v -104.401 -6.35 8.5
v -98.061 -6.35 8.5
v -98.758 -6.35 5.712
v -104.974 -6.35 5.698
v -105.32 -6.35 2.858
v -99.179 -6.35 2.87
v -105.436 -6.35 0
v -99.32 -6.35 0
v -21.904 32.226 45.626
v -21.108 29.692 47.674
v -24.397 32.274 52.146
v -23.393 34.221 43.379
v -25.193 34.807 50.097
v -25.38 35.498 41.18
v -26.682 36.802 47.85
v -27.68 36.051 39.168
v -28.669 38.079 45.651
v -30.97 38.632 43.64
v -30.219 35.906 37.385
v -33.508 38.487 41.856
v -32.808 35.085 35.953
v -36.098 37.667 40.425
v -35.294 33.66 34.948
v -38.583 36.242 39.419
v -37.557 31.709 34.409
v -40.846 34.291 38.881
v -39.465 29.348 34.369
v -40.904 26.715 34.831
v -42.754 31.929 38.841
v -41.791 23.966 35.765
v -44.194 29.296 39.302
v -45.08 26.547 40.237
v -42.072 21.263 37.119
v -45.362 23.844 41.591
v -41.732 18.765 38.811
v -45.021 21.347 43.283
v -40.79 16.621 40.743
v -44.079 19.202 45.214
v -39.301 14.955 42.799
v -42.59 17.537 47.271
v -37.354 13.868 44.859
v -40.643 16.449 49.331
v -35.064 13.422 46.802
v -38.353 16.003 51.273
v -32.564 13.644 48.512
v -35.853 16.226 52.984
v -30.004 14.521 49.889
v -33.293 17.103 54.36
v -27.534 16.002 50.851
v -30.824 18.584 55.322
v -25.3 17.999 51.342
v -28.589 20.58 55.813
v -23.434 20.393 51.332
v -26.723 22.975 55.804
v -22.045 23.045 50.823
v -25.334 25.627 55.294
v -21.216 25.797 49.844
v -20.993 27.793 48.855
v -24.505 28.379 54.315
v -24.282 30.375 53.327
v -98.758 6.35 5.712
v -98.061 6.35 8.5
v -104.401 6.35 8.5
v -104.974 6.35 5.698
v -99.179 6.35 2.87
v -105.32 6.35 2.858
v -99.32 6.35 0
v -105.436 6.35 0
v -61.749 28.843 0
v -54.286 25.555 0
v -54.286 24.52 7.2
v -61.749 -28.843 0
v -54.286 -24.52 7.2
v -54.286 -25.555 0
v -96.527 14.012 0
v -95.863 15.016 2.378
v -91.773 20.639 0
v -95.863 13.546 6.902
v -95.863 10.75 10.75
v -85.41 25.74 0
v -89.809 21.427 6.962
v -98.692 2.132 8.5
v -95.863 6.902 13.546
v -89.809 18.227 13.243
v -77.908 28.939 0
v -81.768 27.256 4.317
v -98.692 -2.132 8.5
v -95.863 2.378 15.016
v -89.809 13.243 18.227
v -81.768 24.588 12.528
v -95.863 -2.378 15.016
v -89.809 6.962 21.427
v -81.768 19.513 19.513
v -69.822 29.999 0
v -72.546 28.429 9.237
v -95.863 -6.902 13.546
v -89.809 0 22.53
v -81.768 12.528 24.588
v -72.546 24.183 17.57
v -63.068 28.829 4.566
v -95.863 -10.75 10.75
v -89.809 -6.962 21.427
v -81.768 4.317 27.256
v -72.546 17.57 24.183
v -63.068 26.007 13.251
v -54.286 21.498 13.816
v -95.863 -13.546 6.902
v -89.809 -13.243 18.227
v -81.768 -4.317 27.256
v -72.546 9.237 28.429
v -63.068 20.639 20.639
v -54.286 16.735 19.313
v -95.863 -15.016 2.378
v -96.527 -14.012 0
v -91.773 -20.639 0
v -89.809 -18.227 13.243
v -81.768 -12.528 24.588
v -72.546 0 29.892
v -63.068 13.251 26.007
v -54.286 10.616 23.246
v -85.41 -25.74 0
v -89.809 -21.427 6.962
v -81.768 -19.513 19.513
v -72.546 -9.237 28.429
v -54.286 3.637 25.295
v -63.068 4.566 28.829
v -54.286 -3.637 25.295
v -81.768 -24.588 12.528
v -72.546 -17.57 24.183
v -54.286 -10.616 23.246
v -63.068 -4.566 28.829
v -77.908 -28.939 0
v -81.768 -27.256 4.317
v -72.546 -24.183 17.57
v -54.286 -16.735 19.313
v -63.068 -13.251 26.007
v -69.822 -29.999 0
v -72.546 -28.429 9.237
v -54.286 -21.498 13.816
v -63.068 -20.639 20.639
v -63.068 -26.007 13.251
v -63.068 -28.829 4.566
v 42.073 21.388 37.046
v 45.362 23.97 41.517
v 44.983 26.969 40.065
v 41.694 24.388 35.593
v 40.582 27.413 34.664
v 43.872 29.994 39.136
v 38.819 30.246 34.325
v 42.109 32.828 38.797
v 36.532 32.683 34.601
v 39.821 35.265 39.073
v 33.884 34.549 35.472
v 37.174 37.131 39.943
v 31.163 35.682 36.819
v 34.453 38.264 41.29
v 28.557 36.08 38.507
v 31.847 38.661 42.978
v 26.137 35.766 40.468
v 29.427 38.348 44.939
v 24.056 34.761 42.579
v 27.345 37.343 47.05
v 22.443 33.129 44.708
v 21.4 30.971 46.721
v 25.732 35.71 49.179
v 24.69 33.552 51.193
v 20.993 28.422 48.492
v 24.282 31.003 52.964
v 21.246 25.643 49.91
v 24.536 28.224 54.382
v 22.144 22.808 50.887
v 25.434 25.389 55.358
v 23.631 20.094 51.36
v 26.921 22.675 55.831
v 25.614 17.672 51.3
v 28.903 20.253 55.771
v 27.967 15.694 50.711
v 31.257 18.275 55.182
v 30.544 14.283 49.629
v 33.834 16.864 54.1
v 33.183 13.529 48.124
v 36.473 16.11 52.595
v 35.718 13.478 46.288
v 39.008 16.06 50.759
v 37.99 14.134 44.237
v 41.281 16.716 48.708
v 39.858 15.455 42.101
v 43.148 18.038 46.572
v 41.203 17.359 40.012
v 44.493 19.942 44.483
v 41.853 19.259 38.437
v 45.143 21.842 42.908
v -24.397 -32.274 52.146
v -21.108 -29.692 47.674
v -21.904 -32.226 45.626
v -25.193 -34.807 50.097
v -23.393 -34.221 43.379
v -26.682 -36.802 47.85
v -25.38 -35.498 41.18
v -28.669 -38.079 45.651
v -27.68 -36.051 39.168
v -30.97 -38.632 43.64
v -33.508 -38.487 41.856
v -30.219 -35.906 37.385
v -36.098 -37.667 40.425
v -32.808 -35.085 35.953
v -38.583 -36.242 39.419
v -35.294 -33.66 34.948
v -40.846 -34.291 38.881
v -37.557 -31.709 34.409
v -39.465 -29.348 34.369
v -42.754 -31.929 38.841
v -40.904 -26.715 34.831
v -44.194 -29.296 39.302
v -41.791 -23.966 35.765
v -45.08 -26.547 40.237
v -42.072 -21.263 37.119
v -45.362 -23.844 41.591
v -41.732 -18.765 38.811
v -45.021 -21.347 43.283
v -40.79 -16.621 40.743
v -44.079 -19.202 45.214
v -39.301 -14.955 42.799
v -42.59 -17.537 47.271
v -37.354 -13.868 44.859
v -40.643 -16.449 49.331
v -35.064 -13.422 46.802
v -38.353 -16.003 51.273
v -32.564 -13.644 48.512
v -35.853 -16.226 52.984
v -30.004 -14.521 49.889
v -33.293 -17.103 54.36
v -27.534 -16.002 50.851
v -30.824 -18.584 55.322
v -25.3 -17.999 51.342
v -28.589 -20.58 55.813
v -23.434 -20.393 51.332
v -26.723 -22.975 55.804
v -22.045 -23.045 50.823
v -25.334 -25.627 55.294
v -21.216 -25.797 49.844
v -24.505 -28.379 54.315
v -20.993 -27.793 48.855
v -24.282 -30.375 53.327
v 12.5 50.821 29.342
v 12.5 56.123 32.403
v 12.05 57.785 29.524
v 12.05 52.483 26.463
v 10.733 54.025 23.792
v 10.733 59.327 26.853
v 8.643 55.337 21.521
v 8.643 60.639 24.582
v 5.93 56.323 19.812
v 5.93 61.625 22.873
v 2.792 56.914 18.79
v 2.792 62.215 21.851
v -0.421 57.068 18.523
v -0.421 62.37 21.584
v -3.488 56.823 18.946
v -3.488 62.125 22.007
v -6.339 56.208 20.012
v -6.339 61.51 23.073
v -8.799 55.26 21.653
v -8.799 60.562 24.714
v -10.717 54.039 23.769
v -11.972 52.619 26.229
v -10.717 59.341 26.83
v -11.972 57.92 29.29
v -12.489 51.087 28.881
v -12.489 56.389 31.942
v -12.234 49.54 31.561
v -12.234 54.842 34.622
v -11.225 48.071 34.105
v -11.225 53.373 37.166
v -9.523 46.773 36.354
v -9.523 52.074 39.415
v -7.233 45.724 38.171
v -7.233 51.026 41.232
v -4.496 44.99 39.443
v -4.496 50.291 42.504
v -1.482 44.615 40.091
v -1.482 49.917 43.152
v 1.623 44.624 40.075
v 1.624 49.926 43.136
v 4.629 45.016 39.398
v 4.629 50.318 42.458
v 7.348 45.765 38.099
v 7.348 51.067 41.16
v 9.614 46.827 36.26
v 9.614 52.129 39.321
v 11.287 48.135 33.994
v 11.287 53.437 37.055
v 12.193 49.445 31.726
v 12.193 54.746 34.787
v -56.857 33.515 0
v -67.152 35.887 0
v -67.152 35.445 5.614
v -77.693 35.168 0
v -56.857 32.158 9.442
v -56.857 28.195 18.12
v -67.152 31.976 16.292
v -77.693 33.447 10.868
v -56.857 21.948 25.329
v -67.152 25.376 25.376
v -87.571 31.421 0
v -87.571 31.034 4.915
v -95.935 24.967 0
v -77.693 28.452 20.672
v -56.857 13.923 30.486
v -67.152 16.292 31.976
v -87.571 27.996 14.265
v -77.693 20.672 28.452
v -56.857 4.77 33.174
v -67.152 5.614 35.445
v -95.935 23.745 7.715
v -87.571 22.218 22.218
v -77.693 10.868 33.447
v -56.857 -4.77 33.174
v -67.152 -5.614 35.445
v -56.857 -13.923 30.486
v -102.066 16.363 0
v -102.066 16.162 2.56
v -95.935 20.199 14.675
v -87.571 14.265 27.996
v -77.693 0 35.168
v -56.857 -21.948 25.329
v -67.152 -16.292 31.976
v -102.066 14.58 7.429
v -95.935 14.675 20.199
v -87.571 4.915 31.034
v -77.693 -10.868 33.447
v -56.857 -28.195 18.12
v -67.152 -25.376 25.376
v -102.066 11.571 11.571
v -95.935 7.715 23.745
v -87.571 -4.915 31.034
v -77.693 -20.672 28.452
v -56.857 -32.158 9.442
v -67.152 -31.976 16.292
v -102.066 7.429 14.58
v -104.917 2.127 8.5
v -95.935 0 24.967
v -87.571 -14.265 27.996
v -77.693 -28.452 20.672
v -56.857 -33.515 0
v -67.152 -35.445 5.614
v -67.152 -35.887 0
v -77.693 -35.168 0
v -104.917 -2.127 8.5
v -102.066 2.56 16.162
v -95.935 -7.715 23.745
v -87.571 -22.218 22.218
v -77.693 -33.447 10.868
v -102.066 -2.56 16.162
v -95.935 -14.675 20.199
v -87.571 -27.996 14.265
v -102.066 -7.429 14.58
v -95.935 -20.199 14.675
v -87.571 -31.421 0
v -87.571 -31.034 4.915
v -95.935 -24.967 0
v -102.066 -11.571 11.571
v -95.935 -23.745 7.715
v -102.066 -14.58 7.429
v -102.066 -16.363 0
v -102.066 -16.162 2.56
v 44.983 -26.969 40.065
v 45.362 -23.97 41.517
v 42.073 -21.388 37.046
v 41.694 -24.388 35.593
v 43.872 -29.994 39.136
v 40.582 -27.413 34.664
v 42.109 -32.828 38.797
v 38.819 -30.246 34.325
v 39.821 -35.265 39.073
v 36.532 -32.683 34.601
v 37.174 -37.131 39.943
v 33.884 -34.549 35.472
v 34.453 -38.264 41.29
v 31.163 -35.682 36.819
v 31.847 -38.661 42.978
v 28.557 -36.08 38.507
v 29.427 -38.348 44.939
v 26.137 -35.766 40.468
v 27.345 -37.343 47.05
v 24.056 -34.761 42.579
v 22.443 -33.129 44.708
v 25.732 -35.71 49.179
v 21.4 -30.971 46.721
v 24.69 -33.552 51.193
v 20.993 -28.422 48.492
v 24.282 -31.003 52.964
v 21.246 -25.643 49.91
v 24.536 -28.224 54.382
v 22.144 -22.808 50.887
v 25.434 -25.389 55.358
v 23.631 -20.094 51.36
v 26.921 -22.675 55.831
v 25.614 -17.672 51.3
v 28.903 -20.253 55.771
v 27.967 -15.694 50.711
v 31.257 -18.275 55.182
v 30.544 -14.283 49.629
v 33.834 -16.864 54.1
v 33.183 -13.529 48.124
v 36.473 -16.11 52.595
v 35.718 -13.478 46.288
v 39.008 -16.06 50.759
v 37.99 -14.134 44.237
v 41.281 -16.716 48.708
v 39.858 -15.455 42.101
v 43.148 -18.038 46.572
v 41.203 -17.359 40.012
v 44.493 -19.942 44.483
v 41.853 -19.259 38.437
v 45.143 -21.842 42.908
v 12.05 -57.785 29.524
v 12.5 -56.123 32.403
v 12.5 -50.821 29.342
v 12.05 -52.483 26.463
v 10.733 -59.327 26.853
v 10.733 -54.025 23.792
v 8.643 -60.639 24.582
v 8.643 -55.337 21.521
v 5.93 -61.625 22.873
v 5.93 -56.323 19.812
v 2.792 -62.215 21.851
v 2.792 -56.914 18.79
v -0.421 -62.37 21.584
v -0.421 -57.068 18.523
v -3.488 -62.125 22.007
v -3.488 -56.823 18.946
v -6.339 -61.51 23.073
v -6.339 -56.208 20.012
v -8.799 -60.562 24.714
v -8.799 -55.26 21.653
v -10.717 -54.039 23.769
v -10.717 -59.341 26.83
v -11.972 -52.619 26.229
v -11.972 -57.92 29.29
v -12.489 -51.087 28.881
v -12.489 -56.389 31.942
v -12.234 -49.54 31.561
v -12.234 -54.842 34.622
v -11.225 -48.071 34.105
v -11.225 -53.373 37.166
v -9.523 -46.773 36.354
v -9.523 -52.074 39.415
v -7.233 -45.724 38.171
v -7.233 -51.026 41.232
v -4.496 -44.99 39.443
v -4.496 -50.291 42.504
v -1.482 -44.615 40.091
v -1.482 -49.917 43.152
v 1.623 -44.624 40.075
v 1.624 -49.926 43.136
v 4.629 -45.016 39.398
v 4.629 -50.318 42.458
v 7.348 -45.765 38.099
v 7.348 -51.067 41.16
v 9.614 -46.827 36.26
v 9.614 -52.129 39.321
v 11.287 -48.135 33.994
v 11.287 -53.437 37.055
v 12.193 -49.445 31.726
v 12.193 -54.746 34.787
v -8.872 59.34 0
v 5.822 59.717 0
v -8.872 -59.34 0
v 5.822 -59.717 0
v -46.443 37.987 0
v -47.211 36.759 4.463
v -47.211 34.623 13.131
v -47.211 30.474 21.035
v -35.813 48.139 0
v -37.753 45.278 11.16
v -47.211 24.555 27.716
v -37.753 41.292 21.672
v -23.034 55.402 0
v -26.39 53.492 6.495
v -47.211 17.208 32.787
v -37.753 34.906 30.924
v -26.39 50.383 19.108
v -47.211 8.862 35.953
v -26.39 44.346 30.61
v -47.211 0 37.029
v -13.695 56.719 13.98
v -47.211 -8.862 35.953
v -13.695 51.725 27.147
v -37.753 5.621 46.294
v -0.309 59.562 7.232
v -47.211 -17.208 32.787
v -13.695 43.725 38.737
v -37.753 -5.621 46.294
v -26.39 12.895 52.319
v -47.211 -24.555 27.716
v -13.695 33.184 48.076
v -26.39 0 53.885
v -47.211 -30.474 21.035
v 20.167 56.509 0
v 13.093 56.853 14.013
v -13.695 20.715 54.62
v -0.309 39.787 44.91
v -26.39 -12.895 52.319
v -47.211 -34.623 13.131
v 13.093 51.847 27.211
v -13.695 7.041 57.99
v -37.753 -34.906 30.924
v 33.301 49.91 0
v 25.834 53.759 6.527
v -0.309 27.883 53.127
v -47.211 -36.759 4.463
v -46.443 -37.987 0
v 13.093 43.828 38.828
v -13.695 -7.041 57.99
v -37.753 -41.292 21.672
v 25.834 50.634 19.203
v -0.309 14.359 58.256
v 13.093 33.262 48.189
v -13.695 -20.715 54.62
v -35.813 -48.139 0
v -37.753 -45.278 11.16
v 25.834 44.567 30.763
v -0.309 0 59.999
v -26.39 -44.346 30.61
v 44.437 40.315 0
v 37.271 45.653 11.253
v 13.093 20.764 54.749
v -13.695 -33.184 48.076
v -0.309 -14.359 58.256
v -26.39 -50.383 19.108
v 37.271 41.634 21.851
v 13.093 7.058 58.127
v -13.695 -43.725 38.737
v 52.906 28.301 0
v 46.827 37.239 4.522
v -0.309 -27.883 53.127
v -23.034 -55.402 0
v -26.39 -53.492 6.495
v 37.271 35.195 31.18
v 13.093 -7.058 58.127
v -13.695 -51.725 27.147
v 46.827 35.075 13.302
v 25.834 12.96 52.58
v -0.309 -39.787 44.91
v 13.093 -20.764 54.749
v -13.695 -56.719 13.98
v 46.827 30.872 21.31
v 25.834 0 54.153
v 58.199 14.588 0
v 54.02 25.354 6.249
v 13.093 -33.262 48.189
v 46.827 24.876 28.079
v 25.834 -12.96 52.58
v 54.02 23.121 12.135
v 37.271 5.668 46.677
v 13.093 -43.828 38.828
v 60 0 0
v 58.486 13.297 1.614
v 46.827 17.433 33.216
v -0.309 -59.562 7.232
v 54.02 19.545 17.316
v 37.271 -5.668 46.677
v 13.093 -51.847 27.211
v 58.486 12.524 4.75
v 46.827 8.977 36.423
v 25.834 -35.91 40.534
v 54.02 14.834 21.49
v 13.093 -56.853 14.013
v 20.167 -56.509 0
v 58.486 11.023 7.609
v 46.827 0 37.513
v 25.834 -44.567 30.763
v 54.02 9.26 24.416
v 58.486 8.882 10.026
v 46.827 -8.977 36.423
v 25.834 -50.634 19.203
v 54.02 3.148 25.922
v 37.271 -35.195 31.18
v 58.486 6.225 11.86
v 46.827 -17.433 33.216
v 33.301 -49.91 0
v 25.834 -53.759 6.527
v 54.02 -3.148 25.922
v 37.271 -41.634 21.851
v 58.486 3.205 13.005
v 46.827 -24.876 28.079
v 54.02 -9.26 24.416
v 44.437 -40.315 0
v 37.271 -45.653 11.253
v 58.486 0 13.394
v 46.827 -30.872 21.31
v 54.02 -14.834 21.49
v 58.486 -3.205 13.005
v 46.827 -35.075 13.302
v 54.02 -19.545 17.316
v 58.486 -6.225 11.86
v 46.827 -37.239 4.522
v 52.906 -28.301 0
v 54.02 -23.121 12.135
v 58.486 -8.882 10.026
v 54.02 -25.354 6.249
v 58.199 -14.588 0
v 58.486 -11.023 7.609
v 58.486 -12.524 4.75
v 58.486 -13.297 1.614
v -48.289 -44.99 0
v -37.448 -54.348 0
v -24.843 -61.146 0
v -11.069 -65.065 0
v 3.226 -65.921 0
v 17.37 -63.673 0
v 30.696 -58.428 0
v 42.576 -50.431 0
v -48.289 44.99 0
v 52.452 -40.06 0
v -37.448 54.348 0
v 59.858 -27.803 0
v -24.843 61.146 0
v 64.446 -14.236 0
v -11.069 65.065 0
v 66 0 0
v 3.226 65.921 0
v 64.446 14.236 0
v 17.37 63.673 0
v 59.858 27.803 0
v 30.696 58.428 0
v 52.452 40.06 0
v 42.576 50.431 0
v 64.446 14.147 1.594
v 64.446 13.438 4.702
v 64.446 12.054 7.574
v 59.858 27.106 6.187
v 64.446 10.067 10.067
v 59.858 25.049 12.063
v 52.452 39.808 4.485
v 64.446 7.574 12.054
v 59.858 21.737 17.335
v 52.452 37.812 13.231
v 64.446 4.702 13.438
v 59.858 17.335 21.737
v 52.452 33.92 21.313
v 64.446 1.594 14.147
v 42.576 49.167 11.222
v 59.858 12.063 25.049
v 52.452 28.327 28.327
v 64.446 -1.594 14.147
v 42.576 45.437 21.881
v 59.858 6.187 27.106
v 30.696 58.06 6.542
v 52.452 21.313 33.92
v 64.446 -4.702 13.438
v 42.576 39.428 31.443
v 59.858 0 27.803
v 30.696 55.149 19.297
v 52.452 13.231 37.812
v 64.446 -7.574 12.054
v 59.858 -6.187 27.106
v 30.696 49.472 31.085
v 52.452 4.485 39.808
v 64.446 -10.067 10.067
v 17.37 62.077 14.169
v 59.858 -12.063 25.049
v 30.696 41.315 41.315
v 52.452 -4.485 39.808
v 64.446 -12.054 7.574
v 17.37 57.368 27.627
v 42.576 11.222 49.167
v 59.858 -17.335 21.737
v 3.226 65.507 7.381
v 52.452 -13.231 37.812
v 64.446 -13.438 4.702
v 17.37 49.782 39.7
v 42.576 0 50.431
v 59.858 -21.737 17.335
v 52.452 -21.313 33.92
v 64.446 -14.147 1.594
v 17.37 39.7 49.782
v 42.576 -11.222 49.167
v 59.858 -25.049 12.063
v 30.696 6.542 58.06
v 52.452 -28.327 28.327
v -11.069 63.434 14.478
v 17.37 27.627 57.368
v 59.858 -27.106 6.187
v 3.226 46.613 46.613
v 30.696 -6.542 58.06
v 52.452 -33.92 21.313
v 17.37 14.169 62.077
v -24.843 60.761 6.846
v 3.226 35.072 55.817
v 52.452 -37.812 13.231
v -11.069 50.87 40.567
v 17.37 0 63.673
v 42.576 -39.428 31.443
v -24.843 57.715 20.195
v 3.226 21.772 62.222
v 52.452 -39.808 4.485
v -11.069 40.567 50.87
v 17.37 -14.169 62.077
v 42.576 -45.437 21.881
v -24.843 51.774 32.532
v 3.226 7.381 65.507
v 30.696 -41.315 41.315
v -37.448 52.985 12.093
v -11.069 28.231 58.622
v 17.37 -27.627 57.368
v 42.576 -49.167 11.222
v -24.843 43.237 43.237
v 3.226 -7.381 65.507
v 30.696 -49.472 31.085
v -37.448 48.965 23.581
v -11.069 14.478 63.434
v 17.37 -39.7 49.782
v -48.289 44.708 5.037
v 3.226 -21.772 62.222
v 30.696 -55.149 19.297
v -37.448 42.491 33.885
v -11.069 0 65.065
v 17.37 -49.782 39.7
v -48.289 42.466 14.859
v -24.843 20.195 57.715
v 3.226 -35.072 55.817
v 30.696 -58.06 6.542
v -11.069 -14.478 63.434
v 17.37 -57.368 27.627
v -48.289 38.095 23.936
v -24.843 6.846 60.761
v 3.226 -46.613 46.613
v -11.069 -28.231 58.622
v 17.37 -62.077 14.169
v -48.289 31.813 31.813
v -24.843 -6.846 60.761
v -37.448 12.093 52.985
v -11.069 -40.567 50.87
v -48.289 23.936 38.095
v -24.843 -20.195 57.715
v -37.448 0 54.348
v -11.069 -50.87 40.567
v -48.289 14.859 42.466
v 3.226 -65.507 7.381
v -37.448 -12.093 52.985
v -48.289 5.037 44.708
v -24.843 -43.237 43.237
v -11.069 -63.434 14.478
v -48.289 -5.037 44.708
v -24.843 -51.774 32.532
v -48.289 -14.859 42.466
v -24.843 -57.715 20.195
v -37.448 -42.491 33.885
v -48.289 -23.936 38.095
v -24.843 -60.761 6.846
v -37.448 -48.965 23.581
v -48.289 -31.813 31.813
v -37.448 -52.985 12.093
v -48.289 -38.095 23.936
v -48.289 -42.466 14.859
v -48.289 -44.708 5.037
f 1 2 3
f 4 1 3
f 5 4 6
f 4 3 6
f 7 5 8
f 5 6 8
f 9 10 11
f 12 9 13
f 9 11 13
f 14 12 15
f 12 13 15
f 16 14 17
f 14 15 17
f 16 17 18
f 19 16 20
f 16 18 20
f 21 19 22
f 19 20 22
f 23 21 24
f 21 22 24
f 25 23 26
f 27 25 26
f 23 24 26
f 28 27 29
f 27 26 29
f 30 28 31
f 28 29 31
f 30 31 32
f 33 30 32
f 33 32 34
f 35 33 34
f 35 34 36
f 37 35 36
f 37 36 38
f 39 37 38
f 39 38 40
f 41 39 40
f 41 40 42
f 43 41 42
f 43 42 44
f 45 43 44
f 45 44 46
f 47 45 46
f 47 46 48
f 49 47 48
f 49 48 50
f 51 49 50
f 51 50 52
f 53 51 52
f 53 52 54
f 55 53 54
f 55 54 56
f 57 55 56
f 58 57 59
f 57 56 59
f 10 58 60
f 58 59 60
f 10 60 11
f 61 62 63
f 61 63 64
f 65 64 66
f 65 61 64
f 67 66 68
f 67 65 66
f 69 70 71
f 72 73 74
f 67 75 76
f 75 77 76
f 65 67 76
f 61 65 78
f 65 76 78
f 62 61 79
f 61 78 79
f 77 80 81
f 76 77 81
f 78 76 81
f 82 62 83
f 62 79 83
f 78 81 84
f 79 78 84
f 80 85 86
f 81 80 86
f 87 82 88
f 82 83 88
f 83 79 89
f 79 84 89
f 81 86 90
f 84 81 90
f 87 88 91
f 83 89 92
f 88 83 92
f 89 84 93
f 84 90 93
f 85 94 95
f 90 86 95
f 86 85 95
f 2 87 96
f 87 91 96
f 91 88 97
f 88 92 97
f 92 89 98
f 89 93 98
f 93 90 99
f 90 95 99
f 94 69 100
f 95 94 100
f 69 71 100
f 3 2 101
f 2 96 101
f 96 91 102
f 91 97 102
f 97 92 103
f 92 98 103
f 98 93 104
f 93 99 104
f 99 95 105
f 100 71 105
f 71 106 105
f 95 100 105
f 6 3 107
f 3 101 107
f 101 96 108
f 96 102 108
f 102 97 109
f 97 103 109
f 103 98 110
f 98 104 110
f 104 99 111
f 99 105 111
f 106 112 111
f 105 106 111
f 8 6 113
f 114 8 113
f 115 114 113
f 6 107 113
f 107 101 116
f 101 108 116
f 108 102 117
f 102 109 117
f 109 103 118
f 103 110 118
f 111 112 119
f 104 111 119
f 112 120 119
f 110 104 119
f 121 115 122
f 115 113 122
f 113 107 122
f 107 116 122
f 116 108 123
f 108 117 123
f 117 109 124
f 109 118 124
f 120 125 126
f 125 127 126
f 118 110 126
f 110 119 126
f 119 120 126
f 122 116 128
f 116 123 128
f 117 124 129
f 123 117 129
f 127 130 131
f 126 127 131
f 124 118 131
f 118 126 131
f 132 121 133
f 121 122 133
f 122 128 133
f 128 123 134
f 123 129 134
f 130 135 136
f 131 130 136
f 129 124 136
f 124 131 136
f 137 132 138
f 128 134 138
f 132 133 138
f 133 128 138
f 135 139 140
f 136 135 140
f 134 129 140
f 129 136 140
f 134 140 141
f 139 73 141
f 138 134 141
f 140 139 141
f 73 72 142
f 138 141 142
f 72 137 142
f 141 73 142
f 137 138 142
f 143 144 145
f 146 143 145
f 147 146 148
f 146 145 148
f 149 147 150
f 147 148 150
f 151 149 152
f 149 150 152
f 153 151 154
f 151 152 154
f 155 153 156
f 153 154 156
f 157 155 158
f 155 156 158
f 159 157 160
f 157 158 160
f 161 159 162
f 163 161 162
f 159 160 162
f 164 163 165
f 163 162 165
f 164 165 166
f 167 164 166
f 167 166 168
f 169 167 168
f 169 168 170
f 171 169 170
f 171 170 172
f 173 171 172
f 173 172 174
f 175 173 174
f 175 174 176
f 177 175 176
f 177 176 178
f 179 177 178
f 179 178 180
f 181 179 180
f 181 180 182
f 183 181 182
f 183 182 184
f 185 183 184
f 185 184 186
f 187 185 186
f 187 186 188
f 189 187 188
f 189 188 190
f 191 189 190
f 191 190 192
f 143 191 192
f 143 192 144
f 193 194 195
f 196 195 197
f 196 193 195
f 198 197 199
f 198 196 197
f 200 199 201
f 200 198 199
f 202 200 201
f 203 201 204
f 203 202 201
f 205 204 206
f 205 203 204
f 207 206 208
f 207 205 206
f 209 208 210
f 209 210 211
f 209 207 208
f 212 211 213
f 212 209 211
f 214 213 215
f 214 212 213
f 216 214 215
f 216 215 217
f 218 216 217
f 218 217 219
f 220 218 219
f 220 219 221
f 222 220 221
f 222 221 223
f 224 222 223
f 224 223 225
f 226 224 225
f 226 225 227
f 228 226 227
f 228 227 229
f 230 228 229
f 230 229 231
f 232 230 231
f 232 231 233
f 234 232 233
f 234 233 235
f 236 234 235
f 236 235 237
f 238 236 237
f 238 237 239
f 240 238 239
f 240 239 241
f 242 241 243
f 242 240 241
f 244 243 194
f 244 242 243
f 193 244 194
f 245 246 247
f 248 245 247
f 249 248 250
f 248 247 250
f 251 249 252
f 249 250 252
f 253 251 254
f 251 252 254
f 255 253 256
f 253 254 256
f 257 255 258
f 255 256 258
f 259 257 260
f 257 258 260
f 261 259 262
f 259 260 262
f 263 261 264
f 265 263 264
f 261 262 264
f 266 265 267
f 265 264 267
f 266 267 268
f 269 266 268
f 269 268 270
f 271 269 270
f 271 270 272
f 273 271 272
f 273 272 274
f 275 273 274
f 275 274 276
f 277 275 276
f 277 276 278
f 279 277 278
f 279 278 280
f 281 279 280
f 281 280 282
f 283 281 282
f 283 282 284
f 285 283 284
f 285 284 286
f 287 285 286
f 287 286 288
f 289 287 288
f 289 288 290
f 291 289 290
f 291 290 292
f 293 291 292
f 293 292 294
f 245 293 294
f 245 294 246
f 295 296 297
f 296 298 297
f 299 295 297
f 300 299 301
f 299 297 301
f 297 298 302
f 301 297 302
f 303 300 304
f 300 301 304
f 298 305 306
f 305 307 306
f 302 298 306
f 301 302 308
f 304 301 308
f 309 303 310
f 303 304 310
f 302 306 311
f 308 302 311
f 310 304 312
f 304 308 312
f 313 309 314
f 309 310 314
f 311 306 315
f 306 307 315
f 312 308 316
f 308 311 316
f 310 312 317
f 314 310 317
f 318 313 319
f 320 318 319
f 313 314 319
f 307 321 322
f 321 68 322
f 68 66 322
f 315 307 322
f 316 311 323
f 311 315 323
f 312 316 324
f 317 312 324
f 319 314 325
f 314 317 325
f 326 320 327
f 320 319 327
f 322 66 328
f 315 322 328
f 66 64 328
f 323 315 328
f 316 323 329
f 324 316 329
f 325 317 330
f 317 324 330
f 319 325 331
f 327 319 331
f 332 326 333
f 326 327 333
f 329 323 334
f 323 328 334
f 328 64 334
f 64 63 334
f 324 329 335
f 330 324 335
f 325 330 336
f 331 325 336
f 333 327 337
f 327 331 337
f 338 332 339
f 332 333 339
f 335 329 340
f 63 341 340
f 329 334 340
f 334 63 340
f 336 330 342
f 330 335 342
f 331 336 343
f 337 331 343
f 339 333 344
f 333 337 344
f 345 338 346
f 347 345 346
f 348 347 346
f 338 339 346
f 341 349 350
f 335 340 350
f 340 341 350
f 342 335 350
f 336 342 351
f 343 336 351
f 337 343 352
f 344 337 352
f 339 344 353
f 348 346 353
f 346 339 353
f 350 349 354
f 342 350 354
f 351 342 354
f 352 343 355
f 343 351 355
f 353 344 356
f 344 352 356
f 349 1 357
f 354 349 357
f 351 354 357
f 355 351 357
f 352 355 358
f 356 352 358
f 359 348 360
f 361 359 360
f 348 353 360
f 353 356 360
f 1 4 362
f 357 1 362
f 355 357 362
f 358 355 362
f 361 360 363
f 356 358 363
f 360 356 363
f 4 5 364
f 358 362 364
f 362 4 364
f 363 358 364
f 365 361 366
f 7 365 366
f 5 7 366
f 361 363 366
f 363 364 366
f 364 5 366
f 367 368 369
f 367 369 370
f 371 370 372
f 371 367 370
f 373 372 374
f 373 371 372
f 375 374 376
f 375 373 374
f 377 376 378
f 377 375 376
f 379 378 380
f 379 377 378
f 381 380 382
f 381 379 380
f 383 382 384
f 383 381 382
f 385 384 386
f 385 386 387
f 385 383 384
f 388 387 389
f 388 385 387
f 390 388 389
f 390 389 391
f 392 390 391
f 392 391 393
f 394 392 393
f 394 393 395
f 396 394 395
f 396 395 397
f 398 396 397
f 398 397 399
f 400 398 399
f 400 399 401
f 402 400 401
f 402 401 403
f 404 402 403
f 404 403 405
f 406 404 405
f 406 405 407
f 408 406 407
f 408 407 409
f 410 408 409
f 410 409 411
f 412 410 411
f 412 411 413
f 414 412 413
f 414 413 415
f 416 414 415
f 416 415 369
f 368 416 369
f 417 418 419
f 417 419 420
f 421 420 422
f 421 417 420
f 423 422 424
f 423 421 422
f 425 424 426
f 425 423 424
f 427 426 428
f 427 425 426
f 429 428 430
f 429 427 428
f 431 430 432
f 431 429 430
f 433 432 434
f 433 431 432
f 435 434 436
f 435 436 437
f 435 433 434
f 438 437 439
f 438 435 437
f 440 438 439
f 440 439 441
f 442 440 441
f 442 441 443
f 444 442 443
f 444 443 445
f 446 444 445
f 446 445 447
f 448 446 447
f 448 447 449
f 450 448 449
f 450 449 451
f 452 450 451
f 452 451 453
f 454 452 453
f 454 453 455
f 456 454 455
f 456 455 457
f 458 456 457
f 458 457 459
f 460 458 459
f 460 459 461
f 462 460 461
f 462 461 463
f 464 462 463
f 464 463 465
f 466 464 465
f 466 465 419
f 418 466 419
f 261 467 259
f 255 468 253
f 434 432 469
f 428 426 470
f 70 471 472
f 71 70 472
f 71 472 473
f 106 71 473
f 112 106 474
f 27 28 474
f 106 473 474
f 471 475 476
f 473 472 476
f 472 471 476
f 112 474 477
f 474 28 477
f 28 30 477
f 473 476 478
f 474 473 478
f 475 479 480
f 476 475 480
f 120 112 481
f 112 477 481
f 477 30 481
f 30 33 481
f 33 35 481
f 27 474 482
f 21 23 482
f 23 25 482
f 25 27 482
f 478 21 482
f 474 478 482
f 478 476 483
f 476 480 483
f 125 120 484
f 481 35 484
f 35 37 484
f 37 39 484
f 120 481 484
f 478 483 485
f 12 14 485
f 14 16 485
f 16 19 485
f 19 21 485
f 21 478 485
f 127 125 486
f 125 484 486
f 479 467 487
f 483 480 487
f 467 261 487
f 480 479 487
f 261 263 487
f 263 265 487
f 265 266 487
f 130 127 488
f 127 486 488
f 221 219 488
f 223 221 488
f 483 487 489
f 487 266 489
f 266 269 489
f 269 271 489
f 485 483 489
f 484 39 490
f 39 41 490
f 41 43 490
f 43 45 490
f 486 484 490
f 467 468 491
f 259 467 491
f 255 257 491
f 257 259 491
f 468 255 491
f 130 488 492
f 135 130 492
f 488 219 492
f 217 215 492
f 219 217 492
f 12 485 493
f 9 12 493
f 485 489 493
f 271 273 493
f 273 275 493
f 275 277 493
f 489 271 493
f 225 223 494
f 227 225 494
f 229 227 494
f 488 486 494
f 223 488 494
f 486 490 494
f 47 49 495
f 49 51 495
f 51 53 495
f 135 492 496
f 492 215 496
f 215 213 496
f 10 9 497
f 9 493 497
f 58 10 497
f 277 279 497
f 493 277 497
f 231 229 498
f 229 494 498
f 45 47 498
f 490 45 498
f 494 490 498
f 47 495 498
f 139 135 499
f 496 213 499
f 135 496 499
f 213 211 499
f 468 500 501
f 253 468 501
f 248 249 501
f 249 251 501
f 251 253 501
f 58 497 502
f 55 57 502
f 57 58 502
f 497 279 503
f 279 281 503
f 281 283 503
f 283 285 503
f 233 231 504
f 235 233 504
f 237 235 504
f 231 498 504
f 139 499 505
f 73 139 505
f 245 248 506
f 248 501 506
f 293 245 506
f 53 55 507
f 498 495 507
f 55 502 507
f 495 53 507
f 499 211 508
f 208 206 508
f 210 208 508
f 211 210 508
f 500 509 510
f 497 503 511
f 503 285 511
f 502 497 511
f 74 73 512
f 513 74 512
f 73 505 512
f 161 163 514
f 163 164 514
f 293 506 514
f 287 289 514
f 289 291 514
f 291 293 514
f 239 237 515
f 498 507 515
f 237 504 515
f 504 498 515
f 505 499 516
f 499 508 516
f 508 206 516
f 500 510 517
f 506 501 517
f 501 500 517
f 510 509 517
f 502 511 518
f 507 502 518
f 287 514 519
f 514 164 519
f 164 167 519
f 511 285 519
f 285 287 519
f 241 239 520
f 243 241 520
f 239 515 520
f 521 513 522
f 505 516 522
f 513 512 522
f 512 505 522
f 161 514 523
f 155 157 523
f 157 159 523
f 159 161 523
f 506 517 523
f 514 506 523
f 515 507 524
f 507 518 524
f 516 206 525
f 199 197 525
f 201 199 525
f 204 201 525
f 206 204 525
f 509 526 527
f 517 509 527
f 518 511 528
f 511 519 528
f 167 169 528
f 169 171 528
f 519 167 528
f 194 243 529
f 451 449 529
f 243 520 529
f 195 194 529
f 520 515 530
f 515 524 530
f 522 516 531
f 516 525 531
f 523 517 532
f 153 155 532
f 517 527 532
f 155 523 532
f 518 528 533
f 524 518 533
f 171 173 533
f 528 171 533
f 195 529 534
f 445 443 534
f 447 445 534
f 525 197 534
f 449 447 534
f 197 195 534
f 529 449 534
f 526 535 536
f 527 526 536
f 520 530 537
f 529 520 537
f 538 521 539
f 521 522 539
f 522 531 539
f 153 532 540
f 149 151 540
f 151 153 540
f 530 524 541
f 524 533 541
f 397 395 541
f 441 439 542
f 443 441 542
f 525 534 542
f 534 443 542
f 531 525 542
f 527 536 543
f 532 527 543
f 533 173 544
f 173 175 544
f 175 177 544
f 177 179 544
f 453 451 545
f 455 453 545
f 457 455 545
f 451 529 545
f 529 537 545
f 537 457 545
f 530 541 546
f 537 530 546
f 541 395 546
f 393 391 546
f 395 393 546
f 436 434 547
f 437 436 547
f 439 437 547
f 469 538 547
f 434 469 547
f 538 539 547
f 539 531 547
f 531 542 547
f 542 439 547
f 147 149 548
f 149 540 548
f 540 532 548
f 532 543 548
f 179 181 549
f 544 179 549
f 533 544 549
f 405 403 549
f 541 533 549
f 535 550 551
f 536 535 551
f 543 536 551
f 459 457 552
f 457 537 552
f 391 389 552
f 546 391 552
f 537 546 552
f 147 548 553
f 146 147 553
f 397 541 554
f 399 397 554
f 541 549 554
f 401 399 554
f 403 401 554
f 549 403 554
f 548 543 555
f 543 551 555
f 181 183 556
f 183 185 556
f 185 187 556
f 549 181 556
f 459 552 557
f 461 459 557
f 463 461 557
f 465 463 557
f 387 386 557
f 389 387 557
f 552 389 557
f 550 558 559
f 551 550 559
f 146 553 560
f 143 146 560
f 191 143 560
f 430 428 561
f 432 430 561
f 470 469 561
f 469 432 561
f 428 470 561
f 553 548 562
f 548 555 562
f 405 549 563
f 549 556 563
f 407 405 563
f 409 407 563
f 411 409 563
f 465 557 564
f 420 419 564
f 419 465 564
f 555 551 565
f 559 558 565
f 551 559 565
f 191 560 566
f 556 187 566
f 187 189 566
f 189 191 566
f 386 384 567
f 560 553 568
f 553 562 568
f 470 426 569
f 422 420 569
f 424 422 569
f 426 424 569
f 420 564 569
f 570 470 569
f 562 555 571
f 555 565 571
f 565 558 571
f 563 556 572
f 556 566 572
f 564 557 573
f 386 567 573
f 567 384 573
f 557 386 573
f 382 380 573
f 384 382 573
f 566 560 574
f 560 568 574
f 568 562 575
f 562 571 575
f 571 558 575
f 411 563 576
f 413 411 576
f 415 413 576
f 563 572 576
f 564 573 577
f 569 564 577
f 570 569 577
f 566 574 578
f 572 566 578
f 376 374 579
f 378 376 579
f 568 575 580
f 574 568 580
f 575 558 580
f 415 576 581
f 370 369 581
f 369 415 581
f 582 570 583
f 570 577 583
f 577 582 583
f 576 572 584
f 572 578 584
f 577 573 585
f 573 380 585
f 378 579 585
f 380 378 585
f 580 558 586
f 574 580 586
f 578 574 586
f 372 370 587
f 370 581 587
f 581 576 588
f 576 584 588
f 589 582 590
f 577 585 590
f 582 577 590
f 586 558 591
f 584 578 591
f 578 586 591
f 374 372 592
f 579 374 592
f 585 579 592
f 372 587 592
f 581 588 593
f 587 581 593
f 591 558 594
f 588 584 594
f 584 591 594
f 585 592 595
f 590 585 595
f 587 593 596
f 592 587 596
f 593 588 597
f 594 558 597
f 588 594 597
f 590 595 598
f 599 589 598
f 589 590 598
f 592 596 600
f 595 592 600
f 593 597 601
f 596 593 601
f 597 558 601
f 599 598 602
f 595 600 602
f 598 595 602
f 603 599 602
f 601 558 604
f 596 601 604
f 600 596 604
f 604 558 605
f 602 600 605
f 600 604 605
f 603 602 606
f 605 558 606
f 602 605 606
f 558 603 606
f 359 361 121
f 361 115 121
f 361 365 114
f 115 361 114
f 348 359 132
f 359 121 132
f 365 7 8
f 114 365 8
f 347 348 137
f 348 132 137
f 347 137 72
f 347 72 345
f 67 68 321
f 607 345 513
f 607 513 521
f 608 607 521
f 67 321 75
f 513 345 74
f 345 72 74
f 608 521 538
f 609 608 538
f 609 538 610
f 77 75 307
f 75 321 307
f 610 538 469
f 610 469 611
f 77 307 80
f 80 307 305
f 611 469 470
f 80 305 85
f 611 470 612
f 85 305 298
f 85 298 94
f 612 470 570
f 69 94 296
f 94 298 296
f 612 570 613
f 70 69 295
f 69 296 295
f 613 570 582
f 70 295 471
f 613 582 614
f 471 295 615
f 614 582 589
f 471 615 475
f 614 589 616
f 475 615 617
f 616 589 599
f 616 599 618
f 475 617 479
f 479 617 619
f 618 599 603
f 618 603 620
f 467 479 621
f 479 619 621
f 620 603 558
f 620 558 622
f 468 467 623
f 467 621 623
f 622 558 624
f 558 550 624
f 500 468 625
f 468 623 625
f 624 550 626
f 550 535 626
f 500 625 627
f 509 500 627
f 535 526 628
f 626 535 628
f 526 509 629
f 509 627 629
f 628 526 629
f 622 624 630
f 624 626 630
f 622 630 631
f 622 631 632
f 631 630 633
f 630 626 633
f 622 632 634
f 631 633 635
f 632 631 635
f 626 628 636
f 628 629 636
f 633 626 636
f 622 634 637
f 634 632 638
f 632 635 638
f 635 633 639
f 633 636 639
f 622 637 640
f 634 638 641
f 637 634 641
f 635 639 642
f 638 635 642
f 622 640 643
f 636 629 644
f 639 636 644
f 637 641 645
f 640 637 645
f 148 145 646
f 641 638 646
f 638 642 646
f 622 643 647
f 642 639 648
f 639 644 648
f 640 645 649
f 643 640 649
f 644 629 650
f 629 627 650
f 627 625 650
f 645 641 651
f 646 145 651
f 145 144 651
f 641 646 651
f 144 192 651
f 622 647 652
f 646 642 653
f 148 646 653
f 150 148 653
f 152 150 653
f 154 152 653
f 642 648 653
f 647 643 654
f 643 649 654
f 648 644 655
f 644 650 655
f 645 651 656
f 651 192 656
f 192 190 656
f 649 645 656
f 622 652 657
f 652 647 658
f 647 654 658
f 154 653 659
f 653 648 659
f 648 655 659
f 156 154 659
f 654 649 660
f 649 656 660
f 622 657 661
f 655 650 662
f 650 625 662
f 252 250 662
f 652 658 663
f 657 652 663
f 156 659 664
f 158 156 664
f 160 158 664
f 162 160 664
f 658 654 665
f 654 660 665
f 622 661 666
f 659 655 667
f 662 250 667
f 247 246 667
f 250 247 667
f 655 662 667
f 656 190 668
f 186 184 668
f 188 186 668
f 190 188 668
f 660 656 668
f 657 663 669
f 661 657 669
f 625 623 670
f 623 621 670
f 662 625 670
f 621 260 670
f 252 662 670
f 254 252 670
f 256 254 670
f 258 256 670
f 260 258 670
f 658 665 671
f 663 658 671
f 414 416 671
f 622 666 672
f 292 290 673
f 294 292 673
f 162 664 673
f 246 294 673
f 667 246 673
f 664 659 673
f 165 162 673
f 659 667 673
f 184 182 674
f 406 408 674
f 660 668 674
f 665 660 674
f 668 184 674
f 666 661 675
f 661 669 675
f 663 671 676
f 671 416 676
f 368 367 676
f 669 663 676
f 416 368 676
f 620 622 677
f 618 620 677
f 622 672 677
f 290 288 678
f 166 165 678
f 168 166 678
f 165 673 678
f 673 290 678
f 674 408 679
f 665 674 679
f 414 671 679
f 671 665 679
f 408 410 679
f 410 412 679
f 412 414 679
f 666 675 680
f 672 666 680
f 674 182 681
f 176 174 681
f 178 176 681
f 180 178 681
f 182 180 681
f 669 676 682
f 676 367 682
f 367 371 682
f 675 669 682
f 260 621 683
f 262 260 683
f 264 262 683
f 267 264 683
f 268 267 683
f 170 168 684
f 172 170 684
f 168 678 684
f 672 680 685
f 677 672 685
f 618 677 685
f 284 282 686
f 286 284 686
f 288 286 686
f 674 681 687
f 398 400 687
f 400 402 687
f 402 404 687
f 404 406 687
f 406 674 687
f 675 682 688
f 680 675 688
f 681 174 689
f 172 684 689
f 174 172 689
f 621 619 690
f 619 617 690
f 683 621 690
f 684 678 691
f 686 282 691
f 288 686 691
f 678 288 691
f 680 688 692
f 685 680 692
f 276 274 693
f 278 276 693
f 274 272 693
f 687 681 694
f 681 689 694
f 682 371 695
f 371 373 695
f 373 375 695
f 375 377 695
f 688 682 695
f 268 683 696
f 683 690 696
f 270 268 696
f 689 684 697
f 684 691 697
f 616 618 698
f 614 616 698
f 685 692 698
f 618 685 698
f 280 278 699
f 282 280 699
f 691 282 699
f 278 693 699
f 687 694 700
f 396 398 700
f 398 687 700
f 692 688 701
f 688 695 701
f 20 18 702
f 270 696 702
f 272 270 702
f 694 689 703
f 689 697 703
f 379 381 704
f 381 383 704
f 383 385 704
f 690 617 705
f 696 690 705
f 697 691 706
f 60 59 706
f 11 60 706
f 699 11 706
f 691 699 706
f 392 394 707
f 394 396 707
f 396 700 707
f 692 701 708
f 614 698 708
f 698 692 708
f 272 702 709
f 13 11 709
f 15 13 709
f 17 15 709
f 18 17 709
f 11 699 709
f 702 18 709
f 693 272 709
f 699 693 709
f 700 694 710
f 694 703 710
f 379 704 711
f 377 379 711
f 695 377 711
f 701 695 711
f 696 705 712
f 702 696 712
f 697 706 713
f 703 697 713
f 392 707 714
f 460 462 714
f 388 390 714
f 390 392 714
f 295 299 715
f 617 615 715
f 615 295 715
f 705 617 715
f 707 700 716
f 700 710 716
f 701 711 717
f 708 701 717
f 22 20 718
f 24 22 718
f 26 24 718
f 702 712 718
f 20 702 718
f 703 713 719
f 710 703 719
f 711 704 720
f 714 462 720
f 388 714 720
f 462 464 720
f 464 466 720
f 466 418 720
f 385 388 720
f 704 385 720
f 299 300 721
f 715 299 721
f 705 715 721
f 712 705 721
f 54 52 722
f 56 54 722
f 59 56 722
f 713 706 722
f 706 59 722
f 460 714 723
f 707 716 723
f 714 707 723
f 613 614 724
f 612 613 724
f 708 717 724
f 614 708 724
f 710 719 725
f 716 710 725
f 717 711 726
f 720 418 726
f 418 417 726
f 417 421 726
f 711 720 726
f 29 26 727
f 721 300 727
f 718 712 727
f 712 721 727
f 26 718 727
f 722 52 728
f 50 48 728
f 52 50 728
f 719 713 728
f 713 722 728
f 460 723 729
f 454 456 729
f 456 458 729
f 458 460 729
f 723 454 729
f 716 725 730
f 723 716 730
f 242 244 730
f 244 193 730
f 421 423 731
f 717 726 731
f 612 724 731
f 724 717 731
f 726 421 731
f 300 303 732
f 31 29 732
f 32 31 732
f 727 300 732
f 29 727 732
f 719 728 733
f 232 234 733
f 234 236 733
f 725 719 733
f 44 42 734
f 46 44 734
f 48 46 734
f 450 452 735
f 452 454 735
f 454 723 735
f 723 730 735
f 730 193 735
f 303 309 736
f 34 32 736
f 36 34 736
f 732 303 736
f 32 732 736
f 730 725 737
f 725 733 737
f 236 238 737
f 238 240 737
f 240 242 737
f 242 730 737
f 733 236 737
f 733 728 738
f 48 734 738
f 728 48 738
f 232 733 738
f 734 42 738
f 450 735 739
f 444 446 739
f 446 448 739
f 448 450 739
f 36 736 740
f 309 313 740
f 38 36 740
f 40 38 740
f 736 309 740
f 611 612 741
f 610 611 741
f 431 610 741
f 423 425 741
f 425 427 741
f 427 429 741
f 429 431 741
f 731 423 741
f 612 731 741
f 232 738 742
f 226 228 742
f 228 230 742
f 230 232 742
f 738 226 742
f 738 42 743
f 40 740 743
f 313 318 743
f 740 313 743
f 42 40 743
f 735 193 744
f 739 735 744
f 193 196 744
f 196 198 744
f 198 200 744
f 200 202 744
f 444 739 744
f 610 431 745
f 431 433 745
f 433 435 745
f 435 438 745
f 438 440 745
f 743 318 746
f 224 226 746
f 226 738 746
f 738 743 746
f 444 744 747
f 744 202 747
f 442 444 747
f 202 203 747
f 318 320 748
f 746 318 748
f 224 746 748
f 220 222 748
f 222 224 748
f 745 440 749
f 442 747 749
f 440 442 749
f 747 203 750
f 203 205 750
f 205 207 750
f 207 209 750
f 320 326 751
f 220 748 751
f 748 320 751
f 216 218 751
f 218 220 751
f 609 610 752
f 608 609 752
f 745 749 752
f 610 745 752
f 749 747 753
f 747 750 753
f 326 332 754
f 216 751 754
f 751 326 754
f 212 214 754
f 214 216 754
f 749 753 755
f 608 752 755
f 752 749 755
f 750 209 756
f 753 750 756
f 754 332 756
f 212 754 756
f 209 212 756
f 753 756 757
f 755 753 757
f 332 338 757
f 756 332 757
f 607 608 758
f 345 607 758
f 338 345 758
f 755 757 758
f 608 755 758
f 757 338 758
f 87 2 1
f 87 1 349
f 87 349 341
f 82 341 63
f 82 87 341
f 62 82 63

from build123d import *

# Parameters (mm, degrees)
REVOLVE1_ANGLE     = 180
SKETCH3_R          = 12.5
SPOT1_DEPTH        = 10
SKETCH4_R          = 12.5
SPOT2_DEPTH        = 10
SKETCH6_R          = 12.5
SPOT3_DEPTH        = 10
SKETCH7_W          = 8.5
SKETCH7_H          = 12.7
CUT_EXTRUDE4_DEPTH = 107


with BuildPart() as part:
    # Sketch1 → Revolve1 (revolve)
    with BuildSketch(Plane.XY):
        with BuildLine():
            Line((-106, 0), (-100, 0))
            ThreePointArc((-100, 0), (-84.638501094, 26.186146828), (-54.285714286, 25.5550626))
            ThreePointArc((-54.285714286, 25.5550626), (13.093073414, 58.554004377), (60, 0))
            Line((60, 0), (66, 0))
            ThreePointArc((66, 0), (17.369924747, 63.673273155), (-56.857142857, 33.515150397))
            ThreePointArc((-56.857142857, 33.515150397), (-90.283702113, 29.741745554), (-106, 0))
        make_face()
    revolve(axis=Axis((-106, 0, 0), (1, 0, 0)), revolution_arc=REVOLVE1_ANGLE)

    # Sketch3 → Spot1 (cut)
    with BuildSketch(Plane(origin=(-35.461774151, 27.831917712, 48.206295549), x_dir=(0.833827643, 0.395653782, 0.384953954), z_dir=(-0.537299608, 0.421695723, 0.730398417))):
        Circle(SKETCH3_R)
    spot1 = extrude(amount=-SPOT1_DEPTH, mode=Mode.SUBTRACT)

    # Sketch4 → Spot2 (cut)
    with BuildSketch(Plane(origin=(35.461774151, 27.831917712, 48.206295549), x_dir=(0.843391446, -0.268649804, -0.46531511), z_dir=(0.537299608, 0.421695723, 0.730398417))):
        Circle(SKETCH4_R)
    spot2 = extrude(amount=-SPOT2_DEPTH, mode=Mode.SUBTRACT)

    # Sketch6 → Spot3 (cut)
    with BuildSketch(Plane(origin=(0, 57.15767665, 33), x_dir=(1, 0, 0), z_dir=(0, 0.866025404, 0.5))):
        Circle(SKETCH6_R)
    spot3 = extrude(amount=-SPOT3_DEPTH, mode=Mode.SUBTRACT)

    # Mirror1: Spot1, Spot2, Spot3 across plane
    add(spot1.mirror(Plane.ZX), mode=Mode.SUBTRACT)
    add(spot2.mirror(Plane.ZX), mode=Mode.SUBTRACT)
    add(spot3.mirror(Plane.ZX), mode=Mode.SUBTRACT)

    # Sketch7 → Cut-Extrude4 (cut, through all)
    with BuildSketch(Plane(origin=(0, 0, 0), x_dir=(0, 0, -1), z_dir=(1, 0, 0))):
        with Locations((-4.25, 0)):
            Rectangle(SKETCH7_W, SKETCH7_H)
    extrude(amount=-CUT_EXTRUDE4_DEPTH, mode=Mode.SUBTRACT)


solid = part.part
